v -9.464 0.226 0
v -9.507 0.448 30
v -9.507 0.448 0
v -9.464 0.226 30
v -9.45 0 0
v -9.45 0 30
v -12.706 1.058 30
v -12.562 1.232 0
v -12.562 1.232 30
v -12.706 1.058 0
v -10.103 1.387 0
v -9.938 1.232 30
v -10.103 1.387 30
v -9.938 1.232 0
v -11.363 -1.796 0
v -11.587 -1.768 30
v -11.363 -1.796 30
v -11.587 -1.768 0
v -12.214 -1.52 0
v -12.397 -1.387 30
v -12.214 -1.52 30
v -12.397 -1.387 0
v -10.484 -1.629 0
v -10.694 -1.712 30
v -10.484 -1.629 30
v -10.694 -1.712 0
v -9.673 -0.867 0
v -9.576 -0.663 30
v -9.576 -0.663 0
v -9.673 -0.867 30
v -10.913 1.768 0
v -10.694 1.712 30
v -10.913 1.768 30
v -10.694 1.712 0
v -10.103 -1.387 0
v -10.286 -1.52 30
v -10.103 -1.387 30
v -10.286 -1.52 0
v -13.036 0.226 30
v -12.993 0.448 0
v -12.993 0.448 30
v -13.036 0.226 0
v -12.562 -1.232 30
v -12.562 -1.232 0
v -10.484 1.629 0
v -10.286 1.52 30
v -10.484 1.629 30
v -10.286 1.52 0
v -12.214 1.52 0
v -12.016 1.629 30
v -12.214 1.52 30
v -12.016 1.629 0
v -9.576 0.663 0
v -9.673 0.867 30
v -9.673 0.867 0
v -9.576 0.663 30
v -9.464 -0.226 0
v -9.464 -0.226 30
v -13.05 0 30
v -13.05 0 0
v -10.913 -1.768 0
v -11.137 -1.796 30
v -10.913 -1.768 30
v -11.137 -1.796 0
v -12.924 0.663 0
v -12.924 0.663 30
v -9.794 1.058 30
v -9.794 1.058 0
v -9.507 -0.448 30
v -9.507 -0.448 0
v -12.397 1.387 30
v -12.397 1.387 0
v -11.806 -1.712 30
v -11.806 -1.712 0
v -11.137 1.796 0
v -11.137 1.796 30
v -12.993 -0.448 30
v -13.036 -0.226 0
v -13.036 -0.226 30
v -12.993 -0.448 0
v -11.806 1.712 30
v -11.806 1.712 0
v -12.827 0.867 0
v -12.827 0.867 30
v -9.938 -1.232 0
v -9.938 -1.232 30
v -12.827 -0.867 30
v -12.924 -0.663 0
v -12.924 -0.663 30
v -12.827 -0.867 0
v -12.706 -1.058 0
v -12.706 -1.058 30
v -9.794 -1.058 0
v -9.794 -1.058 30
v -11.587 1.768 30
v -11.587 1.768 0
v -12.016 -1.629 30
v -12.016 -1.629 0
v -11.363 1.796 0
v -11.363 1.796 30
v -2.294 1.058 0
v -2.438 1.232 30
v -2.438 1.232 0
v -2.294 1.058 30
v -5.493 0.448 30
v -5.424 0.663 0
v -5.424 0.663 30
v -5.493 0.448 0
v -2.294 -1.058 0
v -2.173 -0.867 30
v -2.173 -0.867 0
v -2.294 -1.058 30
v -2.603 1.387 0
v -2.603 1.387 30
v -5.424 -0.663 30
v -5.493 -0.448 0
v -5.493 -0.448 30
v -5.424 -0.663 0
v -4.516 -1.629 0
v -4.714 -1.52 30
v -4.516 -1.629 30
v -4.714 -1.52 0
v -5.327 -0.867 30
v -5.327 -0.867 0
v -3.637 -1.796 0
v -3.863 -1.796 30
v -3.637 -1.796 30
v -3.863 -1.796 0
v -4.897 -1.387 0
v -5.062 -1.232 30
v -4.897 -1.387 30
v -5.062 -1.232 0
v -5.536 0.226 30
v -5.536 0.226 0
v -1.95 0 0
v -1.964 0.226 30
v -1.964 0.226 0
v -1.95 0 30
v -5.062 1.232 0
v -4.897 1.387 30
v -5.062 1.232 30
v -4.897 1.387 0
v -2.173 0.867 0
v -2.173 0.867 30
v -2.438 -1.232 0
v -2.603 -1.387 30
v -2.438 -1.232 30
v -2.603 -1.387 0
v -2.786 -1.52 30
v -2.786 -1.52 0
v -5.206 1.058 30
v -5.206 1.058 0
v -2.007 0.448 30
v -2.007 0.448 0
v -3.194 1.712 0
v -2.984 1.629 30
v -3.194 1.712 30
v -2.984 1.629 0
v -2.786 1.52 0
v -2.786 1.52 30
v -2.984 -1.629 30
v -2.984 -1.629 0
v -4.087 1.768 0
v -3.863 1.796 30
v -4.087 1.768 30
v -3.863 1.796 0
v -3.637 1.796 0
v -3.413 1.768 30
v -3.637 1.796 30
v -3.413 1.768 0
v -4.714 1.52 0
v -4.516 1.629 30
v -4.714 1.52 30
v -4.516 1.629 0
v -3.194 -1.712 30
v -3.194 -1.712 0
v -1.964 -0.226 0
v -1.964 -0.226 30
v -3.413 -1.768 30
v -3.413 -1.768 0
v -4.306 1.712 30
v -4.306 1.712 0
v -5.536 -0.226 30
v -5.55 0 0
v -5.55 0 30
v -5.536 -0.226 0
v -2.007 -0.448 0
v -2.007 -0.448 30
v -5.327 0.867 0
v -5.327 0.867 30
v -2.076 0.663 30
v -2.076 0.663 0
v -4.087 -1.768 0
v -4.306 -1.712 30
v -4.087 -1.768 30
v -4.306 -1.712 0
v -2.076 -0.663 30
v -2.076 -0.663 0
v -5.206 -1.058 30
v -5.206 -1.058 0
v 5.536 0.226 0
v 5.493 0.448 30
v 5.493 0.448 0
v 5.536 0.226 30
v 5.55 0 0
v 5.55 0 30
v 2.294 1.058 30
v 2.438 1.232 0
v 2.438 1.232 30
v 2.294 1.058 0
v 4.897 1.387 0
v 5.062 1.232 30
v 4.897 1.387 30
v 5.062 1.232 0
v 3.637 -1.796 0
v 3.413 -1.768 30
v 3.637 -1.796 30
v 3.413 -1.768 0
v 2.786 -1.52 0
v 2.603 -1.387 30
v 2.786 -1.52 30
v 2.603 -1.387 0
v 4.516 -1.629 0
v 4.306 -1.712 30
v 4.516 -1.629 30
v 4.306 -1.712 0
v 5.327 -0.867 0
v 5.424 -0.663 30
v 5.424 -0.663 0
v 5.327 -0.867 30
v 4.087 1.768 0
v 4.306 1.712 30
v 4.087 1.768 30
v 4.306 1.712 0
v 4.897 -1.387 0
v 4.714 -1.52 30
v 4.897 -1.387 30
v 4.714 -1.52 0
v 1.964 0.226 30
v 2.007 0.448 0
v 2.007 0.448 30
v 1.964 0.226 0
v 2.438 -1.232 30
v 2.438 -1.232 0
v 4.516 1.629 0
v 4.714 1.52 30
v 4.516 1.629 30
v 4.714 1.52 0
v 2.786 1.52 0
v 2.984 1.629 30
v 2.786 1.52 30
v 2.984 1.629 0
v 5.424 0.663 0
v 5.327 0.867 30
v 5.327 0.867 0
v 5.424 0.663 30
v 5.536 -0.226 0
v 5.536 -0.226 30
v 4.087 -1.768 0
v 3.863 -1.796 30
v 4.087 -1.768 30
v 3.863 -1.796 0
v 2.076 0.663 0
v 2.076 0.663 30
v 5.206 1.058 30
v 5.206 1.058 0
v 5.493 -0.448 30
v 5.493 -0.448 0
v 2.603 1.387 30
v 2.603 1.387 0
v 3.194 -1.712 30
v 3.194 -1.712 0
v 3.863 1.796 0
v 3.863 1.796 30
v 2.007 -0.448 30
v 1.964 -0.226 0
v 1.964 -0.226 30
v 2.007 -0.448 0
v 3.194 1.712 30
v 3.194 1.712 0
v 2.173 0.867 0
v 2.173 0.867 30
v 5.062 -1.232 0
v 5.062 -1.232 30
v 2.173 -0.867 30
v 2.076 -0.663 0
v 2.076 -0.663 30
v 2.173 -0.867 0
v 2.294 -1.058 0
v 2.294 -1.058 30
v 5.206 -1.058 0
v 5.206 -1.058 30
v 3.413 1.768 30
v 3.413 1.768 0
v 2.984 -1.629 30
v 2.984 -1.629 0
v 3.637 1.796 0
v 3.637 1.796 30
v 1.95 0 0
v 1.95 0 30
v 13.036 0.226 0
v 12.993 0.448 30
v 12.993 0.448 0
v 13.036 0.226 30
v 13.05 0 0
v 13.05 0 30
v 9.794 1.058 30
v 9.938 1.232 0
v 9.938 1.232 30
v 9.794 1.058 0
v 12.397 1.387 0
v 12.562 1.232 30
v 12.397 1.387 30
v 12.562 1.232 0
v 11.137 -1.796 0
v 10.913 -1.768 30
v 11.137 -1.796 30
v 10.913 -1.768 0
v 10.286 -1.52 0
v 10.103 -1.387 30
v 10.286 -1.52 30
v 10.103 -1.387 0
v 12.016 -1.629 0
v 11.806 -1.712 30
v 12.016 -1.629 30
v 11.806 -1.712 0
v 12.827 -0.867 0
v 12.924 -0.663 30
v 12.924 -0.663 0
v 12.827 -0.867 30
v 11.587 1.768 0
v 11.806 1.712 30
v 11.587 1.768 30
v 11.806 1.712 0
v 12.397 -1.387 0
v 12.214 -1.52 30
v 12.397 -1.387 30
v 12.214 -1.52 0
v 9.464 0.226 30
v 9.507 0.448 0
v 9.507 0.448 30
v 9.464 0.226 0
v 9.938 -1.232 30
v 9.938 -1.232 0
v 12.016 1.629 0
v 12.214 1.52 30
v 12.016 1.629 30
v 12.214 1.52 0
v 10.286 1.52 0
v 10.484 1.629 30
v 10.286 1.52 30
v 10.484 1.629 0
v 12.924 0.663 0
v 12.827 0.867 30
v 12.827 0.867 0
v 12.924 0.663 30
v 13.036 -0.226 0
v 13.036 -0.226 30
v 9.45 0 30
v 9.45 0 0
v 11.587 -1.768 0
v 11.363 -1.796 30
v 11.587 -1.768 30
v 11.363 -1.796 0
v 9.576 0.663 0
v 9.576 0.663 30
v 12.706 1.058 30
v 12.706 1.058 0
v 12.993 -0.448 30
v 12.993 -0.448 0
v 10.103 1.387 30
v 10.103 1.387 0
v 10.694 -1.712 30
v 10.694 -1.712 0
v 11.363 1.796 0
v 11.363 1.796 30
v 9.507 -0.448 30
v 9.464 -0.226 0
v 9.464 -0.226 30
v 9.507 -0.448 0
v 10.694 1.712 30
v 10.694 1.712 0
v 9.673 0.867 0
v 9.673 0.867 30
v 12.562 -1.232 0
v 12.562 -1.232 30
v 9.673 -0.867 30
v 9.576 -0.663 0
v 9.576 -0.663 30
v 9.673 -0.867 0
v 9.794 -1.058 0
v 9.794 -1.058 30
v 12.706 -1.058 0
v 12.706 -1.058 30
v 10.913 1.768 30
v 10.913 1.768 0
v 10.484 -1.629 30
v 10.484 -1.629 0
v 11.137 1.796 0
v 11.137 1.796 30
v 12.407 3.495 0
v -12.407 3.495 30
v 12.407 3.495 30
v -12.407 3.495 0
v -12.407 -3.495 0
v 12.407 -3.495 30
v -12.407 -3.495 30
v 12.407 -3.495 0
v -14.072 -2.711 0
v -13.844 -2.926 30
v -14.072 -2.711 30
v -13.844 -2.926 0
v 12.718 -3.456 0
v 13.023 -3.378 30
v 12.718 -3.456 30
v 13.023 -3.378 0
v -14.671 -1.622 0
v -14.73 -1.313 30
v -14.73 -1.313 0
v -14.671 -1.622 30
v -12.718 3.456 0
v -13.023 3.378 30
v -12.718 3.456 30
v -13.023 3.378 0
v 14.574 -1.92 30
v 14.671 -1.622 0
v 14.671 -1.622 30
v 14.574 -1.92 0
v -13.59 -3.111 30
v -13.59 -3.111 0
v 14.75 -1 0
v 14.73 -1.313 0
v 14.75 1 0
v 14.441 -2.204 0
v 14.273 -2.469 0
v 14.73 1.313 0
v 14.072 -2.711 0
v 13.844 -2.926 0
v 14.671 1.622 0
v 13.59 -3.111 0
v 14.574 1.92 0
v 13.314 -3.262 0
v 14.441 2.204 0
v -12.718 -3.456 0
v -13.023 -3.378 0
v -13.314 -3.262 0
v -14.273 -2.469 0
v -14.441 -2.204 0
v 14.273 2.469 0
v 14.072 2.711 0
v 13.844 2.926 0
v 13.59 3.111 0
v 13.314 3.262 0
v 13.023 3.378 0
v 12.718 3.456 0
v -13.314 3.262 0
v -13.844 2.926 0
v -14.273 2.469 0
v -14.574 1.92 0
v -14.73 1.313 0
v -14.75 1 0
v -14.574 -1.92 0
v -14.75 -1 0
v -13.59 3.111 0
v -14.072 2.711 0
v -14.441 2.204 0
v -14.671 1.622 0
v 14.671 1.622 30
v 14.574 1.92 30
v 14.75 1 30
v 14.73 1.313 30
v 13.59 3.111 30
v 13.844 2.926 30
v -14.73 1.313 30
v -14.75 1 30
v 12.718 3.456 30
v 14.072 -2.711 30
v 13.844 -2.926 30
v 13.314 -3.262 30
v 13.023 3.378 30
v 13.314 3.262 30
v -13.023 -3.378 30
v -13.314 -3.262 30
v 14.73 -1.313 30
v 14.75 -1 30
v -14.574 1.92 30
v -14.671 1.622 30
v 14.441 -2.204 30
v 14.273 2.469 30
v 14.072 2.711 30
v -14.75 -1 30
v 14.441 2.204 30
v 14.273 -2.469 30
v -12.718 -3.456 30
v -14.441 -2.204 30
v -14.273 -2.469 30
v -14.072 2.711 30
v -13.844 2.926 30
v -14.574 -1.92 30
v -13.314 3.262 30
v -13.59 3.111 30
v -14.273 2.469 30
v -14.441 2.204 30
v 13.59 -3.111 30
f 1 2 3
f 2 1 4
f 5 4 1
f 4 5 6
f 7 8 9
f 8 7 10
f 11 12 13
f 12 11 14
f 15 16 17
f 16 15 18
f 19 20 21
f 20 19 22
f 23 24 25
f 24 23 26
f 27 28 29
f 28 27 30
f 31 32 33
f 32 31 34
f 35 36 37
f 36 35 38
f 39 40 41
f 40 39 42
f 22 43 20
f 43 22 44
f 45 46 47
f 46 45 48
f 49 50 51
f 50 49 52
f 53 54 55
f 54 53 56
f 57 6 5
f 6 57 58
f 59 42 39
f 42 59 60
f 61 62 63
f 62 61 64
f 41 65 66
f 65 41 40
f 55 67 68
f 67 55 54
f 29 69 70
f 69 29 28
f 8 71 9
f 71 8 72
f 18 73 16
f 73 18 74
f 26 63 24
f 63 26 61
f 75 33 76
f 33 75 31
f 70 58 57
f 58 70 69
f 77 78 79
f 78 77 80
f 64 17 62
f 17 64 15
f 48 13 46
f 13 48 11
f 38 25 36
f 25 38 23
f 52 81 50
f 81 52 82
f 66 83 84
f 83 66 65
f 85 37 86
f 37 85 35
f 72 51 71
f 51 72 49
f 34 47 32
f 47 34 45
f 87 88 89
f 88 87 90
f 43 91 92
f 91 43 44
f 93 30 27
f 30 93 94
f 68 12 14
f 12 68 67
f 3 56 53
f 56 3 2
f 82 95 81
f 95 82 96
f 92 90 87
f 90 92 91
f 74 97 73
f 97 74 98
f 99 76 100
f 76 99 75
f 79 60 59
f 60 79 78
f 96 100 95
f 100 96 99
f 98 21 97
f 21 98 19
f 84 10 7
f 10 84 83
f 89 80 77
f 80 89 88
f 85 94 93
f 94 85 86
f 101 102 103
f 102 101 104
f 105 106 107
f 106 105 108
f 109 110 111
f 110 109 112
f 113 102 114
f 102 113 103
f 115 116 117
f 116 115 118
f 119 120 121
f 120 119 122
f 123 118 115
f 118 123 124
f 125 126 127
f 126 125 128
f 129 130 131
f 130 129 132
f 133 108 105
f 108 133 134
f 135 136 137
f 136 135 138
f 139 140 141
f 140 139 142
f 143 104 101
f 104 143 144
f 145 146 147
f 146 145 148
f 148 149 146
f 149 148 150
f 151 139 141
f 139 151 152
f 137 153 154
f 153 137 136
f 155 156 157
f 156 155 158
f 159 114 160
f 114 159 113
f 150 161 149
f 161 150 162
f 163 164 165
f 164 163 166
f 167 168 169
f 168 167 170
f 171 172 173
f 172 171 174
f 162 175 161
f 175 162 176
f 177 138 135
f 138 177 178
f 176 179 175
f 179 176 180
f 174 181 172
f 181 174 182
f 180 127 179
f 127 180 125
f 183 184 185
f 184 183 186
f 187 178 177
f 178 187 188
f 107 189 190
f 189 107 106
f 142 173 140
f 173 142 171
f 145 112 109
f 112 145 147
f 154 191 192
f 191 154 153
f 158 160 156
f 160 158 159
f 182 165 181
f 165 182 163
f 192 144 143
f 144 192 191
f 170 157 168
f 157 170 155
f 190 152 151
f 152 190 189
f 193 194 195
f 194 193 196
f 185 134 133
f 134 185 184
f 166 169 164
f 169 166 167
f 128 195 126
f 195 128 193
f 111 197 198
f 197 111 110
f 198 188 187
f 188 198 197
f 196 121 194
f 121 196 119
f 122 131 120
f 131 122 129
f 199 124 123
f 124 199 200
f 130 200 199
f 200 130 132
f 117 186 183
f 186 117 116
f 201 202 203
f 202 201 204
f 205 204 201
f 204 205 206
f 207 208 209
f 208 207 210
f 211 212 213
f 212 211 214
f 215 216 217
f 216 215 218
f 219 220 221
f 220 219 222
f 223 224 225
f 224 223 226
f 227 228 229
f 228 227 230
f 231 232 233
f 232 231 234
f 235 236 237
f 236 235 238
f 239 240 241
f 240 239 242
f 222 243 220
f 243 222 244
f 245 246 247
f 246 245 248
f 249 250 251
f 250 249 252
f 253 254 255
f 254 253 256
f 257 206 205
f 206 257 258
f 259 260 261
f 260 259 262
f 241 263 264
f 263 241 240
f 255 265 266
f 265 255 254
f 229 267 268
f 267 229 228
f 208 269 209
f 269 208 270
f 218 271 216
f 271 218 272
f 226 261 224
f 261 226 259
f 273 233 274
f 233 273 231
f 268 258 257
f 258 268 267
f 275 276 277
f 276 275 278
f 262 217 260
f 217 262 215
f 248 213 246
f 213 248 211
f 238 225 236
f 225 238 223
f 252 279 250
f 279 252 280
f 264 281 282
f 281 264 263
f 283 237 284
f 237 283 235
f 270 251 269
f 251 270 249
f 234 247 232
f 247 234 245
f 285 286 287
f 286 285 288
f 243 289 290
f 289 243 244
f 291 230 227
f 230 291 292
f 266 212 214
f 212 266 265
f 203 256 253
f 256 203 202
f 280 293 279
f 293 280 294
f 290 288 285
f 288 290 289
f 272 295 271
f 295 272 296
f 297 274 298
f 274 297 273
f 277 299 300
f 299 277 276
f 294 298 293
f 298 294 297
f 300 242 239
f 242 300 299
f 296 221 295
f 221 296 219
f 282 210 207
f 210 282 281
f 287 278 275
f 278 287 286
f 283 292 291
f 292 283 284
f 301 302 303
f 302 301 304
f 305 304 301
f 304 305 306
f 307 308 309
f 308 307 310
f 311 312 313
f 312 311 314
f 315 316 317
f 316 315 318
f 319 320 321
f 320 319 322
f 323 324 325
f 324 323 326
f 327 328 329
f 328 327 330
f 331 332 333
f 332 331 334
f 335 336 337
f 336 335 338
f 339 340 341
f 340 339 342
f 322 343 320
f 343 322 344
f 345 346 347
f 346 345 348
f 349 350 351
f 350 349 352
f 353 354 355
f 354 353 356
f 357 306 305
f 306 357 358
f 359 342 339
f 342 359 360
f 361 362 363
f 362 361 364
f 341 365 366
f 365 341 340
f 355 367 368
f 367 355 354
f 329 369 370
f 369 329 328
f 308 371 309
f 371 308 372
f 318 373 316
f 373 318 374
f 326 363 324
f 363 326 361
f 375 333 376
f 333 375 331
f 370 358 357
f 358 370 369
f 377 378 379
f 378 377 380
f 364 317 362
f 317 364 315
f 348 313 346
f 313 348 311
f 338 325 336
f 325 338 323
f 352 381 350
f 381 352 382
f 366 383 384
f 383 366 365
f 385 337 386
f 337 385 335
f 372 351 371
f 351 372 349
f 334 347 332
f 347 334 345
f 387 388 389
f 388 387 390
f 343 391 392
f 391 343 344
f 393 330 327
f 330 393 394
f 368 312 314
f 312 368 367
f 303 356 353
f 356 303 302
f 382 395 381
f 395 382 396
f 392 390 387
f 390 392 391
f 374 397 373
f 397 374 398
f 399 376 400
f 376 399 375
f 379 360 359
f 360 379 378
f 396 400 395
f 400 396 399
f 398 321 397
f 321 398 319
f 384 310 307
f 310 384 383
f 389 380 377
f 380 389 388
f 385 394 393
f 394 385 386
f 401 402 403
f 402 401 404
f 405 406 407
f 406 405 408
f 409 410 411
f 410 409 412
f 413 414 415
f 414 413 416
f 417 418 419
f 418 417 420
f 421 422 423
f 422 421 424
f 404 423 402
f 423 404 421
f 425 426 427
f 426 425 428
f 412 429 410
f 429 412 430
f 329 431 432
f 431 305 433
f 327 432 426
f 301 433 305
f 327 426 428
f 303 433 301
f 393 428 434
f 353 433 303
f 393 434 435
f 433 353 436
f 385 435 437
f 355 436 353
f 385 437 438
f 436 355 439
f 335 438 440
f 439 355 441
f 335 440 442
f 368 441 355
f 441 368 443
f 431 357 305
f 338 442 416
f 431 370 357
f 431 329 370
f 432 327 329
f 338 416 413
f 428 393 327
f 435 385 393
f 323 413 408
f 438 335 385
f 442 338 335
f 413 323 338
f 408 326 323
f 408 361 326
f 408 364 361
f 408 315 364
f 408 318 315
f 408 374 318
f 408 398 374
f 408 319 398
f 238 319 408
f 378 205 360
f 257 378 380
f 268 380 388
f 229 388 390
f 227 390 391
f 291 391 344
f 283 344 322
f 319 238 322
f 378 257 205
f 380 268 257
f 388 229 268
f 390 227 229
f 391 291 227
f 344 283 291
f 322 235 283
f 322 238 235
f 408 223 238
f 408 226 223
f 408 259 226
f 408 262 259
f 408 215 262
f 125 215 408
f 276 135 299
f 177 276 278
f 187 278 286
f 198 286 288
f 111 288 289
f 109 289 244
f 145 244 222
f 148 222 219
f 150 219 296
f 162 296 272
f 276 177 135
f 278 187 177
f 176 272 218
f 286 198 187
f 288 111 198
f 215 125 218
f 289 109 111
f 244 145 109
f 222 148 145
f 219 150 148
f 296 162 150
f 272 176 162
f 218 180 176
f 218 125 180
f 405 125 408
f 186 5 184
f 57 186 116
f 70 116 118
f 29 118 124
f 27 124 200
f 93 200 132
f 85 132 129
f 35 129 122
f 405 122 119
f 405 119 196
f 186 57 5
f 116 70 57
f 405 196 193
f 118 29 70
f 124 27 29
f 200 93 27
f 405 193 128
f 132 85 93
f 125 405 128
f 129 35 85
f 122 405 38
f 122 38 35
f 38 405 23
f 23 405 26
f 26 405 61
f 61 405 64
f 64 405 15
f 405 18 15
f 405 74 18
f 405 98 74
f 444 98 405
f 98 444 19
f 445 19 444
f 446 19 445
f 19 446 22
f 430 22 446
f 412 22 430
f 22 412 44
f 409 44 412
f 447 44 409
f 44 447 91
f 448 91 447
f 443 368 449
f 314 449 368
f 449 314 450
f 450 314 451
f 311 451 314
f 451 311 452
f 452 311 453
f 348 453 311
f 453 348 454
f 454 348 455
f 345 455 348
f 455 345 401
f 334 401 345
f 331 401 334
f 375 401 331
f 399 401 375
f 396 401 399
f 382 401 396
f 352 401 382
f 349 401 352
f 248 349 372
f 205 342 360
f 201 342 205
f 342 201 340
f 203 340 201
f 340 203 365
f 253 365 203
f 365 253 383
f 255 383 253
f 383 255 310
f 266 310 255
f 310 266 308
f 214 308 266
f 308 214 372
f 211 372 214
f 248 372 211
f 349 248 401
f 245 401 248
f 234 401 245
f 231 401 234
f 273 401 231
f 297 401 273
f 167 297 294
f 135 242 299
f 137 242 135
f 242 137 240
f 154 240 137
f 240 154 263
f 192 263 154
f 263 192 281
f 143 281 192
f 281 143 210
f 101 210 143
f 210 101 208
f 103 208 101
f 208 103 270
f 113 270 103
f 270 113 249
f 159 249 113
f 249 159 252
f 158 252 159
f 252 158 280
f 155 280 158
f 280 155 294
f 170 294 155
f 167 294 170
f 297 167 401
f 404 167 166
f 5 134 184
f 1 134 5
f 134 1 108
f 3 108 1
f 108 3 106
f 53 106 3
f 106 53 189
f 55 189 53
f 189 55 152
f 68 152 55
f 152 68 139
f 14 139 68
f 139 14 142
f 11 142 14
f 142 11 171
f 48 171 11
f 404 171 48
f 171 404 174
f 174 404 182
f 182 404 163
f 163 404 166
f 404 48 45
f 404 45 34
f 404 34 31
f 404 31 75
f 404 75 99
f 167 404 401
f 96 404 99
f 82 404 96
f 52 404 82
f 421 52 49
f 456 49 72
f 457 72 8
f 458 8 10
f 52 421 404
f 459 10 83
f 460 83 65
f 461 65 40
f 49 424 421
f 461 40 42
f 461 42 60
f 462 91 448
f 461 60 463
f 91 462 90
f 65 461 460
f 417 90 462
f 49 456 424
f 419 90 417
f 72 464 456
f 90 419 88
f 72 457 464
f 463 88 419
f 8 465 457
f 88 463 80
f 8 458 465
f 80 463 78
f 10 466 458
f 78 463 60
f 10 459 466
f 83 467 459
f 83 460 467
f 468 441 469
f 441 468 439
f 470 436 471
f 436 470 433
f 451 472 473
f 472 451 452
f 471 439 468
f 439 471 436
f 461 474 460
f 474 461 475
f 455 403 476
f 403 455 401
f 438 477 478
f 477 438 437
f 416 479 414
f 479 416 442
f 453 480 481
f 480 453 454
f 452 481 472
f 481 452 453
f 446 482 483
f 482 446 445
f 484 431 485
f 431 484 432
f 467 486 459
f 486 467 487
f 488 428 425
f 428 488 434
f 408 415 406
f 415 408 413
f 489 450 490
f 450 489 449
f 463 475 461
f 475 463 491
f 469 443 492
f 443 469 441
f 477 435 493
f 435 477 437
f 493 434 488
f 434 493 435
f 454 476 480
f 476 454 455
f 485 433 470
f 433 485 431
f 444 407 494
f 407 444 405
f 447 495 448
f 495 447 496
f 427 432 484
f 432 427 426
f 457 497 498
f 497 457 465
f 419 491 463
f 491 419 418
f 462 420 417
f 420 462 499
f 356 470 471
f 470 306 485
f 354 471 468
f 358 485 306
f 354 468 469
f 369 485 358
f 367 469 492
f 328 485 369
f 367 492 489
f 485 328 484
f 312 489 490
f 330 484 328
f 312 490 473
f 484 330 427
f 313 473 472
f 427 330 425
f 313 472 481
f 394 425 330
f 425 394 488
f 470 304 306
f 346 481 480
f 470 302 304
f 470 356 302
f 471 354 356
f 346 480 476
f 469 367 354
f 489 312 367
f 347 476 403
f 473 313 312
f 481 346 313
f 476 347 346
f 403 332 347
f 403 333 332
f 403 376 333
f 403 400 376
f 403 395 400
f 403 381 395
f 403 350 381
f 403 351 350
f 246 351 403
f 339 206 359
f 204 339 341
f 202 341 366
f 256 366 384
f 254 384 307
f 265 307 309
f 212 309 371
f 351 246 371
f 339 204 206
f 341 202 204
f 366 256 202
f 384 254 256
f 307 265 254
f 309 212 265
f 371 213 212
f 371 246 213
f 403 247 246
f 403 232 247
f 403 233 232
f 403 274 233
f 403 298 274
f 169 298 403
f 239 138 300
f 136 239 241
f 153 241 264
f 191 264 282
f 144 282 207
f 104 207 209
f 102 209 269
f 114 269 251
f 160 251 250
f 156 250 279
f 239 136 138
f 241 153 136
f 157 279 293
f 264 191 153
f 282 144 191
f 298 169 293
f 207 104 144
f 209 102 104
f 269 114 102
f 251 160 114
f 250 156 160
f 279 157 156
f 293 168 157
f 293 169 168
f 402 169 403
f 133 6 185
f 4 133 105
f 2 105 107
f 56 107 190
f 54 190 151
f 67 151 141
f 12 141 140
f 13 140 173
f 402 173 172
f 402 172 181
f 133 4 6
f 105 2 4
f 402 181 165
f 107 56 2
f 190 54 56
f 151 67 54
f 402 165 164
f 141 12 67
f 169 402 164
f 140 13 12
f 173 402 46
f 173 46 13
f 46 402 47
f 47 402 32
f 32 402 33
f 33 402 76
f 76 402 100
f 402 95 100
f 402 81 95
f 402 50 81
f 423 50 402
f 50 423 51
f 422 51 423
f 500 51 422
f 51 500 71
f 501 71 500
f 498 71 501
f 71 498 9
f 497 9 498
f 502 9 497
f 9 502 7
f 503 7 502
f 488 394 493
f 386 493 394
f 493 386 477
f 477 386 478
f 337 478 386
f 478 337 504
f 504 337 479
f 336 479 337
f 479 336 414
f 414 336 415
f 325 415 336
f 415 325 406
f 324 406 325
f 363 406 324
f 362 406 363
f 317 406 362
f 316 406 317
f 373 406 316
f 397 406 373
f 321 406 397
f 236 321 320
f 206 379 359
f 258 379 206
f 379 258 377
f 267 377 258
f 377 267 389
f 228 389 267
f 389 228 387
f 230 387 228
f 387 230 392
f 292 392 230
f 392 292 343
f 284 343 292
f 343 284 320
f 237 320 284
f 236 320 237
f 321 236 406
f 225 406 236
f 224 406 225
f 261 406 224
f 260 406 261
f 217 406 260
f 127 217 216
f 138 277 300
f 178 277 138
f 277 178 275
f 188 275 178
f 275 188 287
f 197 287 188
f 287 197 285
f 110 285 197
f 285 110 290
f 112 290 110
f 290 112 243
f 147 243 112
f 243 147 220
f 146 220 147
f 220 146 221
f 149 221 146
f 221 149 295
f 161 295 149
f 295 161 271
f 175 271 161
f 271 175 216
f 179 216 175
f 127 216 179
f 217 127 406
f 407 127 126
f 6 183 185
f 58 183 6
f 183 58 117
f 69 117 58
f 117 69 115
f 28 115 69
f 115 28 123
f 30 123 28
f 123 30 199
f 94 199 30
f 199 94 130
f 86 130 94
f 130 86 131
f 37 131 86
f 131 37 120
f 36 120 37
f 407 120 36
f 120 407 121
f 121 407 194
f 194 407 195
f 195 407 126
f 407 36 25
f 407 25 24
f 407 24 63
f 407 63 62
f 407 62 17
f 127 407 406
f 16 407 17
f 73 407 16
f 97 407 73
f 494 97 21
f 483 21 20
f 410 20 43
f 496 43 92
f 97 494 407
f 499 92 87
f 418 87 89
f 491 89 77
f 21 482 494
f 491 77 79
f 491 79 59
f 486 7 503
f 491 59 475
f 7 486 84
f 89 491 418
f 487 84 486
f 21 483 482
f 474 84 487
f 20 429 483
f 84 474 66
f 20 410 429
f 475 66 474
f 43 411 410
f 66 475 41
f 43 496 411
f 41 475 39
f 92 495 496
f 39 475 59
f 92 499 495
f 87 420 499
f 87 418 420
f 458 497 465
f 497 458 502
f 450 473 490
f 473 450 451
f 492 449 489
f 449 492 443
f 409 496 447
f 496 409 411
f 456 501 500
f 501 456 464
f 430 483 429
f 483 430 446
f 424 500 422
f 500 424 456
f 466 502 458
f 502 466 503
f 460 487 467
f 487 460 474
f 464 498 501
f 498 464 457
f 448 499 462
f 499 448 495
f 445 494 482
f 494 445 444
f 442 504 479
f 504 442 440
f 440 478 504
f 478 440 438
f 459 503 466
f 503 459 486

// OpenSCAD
$fn = 50;


difference() {
	union() {
		translate(v = [0, 0, 0]) {
			rotate(a = [0, 0, 0]) {
				hull() {
					translate(v = [-12.2500000000, 1.0000000000, 0]) {
						rotate(a = [0, 0, 0]) {
							translate(v = [0, 0, 0]) {
								rotate(a = [0, 0, 0]) {
									cylinder(h = 30, r = 2.5000000000);
								}
							}
						}
					}
					translate(v = [12.2500000000, 1.0000000000, 0]) {
						rotate(a = [0, 0, 0]) {
							translate(v = [0, 0, 0]) {
								rotate(a = [0, 0, 0]) {
									cylinder(h = 30, r = 2.5000000000);
								}
							}
						}
					}
					translate(v = [-12.2500000000, -1.0000000000, 0]) {
						rotate(a = [0, 0, 0]) {
							translate(v = [0, 0, 0]) {
								rotate(a = [0, 0, 0]) {
									cylinder(h = 30, r = 2.5000000000);
								}
							}
						}
					}
					translate(v = [12.2500000000, -1.0000000000, 0]) {
						rotate(a = [0, 0, 0]) {
							translate(v = [0, 0, 0]) {
								rotate(a = [0, 0, 0]) {
									cylinder(h = 30, r = 2.5000000000);
								}
							}
						}
					}
				}
			}
		}
	}
	union() {
		translate(v = [-11.2500000000, 0.0000000000, 0]) {
			rotate(a = [0, 0, 0]) {
				translate(v = [0, 0, -50]) {
					rotate(a = [0, 0, 0]) {
						cylinder(h = 100, r = 1.8000000000);
					}
				}
			}
		}
		translate(v = [-3.7500000000, 0.0000000000, 0]) {
			rotate(a = [0, 0, 0]) {
				translate(v = [0, 0, -50]) {
					rotate(a = [0, 0, 0]) {
						cylinder(h = 100, r = 1.8000000000);
					}
				}
			}
		}
		translate(v = [3.7500000000, 0.0000000000, 0]) {
			rotate(a = [0, 0, 0]) {
				translate(v = [0, 0, -50]) {
					rotate(a = [0, 0, 0]) {
						cylinder(h = 100, r = 1.8000000000);
					}
				}
			}
		}
		translate(v = [11.2500000000, 0.0000000000, 0]) {
			rotate(a = [0, 0, 0]) {
				translate(v = [0, 0, -50]) {
					rotate(a = [0, 0, 0]) {
						cylinder(h = 100, r = 1.8000000000);
					}
				}
			}
		}
	}
}
